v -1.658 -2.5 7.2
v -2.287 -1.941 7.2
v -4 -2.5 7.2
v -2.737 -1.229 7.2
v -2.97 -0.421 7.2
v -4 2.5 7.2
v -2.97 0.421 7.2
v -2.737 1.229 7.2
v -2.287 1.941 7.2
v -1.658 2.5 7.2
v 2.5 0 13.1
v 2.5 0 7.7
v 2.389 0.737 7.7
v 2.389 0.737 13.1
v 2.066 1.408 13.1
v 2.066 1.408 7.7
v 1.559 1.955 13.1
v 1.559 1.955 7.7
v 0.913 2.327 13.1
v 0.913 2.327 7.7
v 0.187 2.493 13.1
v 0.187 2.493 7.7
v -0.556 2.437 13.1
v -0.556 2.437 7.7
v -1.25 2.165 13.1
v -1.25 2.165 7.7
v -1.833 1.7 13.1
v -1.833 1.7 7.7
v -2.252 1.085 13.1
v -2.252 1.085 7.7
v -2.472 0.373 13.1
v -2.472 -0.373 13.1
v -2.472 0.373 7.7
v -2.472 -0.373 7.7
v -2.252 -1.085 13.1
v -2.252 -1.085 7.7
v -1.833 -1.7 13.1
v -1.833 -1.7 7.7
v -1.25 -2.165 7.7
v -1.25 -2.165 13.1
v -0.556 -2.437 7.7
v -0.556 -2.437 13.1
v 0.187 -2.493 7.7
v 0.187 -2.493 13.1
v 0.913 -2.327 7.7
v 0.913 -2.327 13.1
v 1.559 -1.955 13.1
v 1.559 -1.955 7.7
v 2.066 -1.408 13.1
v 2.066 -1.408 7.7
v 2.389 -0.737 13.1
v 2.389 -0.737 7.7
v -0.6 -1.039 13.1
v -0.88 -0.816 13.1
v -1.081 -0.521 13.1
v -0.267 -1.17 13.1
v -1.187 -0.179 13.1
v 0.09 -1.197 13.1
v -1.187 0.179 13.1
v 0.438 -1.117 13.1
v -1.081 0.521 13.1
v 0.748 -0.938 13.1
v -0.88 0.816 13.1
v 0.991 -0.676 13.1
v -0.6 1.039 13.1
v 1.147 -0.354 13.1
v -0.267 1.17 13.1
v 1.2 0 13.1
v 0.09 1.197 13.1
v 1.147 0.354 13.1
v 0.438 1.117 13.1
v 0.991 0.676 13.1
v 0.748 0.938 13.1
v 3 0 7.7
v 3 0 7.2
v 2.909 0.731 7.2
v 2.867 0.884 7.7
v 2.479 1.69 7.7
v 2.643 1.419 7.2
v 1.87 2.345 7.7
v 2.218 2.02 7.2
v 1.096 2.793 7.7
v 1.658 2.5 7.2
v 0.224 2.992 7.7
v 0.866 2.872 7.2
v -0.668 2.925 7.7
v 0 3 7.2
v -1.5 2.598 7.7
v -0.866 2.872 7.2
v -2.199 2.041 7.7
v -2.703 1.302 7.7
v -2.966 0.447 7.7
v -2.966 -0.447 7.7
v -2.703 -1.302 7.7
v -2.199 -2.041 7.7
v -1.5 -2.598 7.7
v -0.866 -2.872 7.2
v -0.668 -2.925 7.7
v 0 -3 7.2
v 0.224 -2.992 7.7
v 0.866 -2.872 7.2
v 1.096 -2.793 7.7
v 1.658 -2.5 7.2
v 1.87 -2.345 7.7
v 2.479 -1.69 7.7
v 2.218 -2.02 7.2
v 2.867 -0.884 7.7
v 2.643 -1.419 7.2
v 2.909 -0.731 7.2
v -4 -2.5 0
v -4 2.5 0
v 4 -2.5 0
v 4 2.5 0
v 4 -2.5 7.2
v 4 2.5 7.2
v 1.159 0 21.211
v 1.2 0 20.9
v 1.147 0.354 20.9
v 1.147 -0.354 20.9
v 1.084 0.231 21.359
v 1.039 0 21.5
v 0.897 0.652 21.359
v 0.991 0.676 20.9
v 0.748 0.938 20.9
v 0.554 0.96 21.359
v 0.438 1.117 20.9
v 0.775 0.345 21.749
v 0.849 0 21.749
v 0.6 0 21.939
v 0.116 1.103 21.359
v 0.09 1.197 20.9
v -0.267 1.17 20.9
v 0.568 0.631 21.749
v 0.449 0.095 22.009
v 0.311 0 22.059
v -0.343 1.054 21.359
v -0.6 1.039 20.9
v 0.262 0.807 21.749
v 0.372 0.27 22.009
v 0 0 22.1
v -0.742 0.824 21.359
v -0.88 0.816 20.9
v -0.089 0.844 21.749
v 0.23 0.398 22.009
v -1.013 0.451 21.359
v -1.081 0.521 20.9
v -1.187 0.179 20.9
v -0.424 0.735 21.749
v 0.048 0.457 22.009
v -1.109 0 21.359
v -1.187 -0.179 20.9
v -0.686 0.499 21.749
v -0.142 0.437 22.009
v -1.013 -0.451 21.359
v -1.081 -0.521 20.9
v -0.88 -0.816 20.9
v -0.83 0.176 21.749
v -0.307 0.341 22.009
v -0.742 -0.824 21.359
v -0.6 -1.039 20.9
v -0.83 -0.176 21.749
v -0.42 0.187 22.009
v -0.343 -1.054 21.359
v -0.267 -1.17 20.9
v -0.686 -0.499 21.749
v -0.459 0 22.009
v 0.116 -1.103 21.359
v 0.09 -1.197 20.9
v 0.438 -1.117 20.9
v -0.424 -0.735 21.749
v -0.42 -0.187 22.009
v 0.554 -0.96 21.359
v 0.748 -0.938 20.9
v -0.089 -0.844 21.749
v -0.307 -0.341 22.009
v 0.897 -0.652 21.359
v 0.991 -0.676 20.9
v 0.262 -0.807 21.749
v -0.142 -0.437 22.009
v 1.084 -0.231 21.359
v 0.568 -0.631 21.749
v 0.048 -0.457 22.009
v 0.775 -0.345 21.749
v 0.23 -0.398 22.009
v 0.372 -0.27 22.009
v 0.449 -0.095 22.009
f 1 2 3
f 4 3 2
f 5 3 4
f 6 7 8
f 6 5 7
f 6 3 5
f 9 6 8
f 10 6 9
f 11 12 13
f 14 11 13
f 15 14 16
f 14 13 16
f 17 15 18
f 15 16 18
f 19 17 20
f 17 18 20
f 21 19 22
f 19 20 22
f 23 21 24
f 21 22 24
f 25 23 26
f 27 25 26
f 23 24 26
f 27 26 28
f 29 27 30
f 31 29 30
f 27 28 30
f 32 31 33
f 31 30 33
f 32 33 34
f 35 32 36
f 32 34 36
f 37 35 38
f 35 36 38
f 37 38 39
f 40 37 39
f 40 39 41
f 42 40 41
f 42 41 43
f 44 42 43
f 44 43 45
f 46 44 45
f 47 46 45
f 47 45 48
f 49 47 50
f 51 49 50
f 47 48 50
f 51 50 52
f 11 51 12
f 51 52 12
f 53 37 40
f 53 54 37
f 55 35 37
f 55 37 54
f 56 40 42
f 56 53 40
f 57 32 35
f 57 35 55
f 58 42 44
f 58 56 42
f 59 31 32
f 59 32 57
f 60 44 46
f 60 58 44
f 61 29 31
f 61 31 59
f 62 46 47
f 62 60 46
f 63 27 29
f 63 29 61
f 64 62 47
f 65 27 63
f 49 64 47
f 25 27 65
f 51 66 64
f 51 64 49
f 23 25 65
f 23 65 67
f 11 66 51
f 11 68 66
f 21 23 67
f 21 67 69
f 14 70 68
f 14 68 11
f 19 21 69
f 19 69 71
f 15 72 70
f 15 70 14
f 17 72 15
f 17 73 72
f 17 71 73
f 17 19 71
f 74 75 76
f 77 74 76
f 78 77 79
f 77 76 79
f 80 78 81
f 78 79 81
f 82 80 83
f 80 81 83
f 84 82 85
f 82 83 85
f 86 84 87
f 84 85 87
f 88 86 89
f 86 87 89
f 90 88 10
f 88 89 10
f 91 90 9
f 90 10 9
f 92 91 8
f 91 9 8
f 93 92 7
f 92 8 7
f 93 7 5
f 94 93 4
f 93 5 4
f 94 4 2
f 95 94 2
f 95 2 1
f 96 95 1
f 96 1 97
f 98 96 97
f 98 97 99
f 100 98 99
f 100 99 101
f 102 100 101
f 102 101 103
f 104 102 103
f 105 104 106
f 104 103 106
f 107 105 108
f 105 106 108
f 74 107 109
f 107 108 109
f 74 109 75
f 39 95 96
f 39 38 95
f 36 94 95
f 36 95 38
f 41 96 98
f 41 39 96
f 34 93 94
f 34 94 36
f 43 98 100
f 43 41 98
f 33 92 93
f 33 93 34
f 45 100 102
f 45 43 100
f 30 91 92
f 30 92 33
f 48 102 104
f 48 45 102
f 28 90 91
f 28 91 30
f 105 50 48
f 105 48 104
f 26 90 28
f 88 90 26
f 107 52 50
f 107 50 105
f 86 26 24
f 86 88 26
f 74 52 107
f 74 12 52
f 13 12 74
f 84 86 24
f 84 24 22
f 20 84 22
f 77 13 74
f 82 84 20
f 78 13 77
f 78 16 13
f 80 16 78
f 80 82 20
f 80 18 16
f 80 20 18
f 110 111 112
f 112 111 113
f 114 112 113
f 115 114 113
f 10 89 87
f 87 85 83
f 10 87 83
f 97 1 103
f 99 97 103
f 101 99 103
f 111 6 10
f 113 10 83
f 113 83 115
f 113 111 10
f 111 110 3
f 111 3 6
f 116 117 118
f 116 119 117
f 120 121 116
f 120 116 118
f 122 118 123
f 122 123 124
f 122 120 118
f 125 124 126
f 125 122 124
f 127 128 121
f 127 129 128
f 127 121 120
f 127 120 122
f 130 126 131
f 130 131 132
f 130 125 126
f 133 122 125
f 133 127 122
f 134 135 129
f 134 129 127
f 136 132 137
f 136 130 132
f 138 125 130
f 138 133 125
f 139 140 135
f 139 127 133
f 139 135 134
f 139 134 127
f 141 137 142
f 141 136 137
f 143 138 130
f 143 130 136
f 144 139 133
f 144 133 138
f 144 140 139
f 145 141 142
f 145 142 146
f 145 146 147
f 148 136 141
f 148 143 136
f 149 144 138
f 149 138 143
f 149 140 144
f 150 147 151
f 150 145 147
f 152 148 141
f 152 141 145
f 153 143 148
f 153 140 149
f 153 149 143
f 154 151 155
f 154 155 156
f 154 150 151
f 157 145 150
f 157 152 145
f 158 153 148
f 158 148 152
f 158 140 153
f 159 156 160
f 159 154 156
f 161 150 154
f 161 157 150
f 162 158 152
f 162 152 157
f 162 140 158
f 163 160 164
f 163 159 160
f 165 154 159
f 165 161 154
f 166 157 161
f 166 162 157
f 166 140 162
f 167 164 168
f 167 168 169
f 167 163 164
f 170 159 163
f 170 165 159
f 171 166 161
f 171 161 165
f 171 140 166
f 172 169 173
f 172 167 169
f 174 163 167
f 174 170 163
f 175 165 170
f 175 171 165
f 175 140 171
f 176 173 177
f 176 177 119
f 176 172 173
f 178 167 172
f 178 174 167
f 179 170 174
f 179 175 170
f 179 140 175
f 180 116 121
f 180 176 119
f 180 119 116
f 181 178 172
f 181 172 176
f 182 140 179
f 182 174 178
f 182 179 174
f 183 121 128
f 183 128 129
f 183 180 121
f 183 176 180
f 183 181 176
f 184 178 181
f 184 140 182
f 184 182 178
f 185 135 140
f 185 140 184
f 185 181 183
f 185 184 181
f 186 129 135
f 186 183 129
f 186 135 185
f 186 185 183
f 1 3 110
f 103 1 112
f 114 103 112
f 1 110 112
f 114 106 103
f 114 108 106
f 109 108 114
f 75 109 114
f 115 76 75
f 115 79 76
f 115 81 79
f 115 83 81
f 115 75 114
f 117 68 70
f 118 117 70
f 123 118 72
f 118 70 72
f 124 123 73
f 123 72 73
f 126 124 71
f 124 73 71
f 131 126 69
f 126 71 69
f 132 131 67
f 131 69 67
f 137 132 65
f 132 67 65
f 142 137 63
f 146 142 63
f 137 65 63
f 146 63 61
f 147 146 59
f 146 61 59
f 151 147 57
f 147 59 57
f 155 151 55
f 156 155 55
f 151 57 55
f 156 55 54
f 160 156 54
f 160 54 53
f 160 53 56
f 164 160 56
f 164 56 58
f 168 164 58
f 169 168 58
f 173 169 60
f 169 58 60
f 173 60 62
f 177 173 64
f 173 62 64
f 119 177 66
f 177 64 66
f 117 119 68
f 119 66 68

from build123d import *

# Parameters (mm, degrees)
F0_W     = 8
F0_H     = 5
F1_DEPTH = 7.2
F2_R     = 3
F3_DEPTH = 0.5
F4_R     = 2.5
F5_DEPTH = 5.4
F6_R     = 1.2
F7_DEPTH = 9
F8_R     = 1.2


with BuildPart() as f1:
    # F0 (on Top) → F1 (new body)
    with BuildSketch(Plane.XY):
        Rectangle(F0_W, F0_H)
    extrude(amount=F1_DEPTH)

    # F2 (on face) → F3 (join)
    with BuildSketch(Plane.XY.offset(7.2)):
        Circle(F2_R)
    extrude(amount=F3_DEPTH)

    # F4 (on face) → F5 (join)
    with BuildSketch(Plane.XY.offset(7.7)):
        Circle(F4_R)
    extrude(amount=F5_DEPTH)

    # F6 (on face) → F7 (join)
    with BuildSketch(Plane.XY.offset(13.1)):
        Circle(F6_R)
    extrude(amount=F7_DEPTH)

    # F8
    f8_edges = [f1.edges().sort_by_distance(p)[0] for p in [
        (-1.2, 0, 22.1),
    ]]
    fillet(f8_edges, radius=F8_R)


solid = f1.part
